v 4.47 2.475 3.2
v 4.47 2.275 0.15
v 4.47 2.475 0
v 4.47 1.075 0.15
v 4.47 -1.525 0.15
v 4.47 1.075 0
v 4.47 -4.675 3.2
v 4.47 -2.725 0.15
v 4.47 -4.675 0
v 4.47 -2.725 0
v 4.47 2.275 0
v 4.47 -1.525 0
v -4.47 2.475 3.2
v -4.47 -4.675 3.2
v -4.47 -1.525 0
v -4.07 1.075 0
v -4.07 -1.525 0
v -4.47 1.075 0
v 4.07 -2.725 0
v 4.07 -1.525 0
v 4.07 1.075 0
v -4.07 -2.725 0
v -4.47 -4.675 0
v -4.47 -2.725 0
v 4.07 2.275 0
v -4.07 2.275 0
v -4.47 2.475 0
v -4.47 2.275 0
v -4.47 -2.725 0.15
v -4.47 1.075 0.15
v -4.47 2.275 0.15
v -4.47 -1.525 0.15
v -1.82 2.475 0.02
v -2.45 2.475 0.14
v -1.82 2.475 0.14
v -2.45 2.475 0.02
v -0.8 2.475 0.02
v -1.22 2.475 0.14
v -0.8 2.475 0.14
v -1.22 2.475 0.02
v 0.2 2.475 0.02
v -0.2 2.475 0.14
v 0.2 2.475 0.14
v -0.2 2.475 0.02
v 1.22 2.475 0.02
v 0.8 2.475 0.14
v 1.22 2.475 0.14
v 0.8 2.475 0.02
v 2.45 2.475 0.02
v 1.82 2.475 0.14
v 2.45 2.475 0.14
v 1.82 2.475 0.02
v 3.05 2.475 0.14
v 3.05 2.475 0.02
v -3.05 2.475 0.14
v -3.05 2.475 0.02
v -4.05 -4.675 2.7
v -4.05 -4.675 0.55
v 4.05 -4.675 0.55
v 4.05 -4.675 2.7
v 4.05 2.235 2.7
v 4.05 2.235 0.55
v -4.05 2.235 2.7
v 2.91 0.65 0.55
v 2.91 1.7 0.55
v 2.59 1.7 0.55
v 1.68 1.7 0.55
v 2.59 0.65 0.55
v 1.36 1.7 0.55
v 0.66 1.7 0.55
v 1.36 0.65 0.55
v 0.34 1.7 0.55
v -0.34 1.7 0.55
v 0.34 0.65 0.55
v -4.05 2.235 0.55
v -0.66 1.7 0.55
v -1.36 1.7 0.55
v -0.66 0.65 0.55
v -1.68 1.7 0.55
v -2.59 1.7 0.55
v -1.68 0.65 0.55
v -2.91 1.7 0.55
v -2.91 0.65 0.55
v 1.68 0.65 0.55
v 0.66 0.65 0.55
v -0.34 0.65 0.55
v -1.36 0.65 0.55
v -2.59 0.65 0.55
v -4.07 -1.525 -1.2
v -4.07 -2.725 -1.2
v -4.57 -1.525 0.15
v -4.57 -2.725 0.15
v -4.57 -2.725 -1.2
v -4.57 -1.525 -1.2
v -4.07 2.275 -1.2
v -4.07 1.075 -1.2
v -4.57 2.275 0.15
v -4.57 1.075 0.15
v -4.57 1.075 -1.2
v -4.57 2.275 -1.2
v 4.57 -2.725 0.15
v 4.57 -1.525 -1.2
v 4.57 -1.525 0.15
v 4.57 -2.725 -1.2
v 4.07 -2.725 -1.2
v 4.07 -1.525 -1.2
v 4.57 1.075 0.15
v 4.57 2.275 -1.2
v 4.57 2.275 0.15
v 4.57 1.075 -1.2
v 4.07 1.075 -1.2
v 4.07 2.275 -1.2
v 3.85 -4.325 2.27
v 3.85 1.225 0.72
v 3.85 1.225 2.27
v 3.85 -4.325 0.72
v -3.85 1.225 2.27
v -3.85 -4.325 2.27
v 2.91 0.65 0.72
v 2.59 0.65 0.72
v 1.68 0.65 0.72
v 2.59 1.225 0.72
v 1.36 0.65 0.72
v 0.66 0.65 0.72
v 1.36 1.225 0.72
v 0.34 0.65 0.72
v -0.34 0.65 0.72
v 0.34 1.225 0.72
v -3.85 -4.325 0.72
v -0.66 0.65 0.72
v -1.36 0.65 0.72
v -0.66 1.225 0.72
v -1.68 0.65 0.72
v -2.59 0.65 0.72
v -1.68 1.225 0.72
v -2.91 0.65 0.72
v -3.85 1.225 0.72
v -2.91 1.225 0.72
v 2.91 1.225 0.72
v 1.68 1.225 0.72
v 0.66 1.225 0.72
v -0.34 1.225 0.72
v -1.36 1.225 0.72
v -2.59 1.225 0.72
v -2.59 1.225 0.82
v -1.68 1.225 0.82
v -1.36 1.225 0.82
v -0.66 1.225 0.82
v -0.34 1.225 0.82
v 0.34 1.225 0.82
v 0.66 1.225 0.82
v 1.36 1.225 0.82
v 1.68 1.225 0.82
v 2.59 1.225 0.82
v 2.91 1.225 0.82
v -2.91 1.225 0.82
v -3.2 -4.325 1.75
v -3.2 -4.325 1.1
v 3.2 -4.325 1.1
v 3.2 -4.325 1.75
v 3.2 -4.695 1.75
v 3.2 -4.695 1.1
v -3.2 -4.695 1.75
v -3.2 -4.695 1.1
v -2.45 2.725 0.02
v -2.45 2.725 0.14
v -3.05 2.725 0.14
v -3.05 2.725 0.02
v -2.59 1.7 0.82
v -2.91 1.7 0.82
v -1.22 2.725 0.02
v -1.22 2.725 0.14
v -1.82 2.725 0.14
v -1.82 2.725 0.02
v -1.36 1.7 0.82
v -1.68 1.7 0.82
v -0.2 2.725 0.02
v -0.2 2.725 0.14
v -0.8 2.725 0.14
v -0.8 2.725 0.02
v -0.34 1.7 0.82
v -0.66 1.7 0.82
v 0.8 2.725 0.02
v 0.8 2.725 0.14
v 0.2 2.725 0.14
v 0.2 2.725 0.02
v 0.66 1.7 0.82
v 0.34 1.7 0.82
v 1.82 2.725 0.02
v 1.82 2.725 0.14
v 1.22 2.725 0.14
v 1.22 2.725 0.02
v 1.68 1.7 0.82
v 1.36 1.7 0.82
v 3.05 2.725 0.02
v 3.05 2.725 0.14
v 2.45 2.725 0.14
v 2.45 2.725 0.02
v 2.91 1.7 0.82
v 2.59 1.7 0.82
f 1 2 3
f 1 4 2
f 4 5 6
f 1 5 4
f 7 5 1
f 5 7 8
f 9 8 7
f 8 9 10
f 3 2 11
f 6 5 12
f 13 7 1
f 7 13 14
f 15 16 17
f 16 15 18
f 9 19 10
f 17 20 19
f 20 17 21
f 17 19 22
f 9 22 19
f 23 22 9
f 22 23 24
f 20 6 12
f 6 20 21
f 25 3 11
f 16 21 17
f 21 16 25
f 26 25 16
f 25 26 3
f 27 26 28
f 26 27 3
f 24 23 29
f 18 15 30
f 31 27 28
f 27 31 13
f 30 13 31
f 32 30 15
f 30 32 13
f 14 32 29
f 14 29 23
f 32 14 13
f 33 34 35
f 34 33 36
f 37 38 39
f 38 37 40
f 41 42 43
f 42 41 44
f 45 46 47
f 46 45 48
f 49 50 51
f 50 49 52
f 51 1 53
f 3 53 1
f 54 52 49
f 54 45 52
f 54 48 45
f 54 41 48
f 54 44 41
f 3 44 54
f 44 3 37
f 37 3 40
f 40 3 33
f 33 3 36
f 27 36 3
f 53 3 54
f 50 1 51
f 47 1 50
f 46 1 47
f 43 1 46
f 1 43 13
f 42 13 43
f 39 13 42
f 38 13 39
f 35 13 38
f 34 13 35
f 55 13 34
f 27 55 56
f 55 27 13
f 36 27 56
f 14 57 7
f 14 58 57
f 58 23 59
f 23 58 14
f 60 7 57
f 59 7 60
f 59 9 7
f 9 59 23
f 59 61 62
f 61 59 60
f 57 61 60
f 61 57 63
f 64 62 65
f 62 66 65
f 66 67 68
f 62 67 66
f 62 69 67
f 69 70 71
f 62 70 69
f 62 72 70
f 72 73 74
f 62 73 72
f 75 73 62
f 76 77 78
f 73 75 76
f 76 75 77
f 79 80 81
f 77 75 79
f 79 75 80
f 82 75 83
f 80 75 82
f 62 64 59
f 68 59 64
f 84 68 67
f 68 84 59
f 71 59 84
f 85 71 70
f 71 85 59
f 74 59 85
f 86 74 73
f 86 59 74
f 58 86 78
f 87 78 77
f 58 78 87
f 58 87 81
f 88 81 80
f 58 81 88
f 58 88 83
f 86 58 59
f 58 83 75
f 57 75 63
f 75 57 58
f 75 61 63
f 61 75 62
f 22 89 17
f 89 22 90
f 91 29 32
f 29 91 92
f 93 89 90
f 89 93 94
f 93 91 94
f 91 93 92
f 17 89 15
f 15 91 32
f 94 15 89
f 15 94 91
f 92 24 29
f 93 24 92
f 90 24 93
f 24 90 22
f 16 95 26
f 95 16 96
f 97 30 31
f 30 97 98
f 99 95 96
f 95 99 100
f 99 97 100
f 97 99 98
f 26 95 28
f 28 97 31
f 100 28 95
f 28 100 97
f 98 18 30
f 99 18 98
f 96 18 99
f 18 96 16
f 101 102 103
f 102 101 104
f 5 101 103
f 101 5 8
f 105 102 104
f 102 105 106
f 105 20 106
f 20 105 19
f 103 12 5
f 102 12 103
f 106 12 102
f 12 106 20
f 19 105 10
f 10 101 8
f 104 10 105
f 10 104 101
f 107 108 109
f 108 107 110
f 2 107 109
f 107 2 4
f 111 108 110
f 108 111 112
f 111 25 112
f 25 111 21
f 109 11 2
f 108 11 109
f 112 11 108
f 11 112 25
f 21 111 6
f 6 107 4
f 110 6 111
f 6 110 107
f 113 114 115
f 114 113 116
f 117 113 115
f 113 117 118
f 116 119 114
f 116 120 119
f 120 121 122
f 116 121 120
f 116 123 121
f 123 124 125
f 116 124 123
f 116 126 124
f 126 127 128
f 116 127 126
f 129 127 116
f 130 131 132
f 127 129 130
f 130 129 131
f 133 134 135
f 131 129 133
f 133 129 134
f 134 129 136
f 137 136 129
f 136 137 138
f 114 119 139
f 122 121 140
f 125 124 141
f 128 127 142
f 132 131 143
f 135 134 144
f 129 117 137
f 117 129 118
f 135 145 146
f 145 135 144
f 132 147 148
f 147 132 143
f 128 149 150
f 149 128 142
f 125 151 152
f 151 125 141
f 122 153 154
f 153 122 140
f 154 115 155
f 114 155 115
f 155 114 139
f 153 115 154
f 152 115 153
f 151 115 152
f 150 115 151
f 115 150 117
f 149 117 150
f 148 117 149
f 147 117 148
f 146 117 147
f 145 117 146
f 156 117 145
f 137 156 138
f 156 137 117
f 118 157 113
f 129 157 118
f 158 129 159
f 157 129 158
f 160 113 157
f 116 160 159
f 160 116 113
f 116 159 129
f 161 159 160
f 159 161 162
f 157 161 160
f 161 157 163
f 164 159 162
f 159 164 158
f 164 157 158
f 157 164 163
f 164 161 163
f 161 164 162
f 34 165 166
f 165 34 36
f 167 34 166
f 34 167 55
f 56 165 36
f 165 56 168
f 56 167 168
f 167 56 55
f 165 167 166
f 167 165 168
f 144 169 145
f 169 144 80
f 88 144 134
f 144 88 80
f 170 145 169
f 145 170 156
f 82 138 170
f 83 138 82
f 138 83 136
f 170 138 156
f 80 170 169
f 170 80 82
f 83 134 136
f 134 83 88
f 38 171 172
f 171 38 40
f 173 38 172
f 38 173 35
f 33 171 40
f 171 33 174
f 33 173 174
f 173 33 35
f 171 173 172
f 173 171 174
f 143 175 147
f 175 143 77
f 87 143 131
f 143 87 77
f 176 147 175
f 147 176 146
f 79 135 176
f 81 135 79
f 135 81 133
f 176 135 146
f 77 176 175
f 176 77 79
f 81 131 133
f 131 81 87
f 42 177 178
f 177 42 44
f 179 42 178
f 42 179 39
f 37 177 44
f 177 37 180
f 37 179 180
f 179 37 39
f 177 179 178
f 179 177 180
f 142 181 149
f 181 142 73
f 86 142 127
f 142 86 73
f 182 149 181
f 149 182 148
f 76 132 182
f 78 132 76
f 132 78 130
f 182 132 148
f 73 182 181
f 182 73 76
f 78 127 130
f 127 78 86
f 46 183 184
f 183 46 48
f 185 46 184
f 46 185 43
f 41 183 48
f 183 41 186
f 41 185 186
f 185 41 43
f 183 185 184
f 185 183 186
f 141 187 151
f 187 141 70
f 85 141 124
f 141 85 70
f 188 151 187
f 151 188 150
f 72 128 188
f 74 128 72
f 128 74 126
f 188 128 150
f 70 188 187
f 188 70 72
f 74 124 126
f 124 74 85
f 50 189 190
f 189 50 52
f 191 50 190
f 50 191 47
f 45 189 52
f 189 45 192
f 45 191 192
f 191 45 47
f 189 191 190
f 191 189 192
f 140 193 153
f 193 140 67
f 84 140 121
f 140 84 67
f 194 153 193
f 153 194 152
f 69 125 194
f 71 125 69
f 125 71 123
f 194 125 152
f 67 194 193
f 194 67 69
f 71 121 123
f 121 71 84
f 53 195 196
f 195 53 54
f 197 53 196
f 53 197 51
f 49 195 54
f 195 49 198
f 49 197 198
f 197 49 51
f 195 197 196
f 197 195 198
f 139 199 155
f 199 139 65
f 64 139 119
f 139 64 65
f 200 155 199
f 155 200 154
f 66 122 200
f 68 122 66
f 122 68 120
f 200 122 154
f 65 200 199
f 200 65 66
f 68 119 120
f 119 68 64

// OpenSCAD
/*
SHOU HAN TYPE-C 6P(073) generated-envelope model.
Evidence: manufacturer drawing page 1, Rev.A, units mm. Coordinate system
matches the rev2 footprint: six contacts at Y=+2.125, shell anchors at
X=+/-4.32, and the receptacle mouth faces -Y. Z=0 is the PCB seating plane.
*/
$fa = 4;
$fs = 0.12;
render_part = "all";
projection_view = "3d";

shell_x = 8.94;
shell_y = 7.15;
shell_z = 3.20;
shell_t = 0.25;
rear_y = 2.475;
front_y = rear_y-shell_y;
contact_x = [-2.75,-1.52,-0.50,0.50,1.52,2.75];

shell_color = [0.72,0.74,0.76];
insert_color = [0.10,0.10,0.11];
contact_color = [0.84,0.65,0.16];

module shell() {
    difference() {
        translate([-shell_x/2,front_y,0]) cube([shell_x,shell_y,shell_z]);
        translate([-4.05,front_y-0.01,0.55]) cube([8.10,shell_y-shell_t+0.02,2.15]);
    }
    for (x=[-4.32,4.32]) for (y=[-2.125,1.675])
        translate([x-0.25,y-0.60,-1.20]) cube([0.50,1.20,1.35]);
}

module insert() {
    translate([-3.85,front_y+0.35,0.72]) cube([7.70,5.55,1.55]);
    translate([-3.20,front_y-0.02,1.10]) cube([6.40,1.60,0.65]);
}

module contacts() {
    for (x=contact_x) {
        translate([x-0.30,1.525,0.02]) cube([0.60,1.20,0.12]);
        translate([x-0.16,0.65,0.12]) cube([0.32,1.05,0.70]);
    }
}

module selected_model() {
    if (render_part == "shell" || render_part == "all") color(shell_color) shell();
    if (render_part == "insert" || render_part == "all") color(insert_color) insert();
    if (render_part == "contacts" || render_part == "all") color(contact_color) contacts();
}

if (projection_view == "top") projection(cut=false) selected_model();
else if (projection_view == "front") projection(cut=false) rotate([90,0,0]) selected_model();
else if (projection_view == "side") projection(cut=false) rotate([90,0,90]) selected_model();
else selected_model();
